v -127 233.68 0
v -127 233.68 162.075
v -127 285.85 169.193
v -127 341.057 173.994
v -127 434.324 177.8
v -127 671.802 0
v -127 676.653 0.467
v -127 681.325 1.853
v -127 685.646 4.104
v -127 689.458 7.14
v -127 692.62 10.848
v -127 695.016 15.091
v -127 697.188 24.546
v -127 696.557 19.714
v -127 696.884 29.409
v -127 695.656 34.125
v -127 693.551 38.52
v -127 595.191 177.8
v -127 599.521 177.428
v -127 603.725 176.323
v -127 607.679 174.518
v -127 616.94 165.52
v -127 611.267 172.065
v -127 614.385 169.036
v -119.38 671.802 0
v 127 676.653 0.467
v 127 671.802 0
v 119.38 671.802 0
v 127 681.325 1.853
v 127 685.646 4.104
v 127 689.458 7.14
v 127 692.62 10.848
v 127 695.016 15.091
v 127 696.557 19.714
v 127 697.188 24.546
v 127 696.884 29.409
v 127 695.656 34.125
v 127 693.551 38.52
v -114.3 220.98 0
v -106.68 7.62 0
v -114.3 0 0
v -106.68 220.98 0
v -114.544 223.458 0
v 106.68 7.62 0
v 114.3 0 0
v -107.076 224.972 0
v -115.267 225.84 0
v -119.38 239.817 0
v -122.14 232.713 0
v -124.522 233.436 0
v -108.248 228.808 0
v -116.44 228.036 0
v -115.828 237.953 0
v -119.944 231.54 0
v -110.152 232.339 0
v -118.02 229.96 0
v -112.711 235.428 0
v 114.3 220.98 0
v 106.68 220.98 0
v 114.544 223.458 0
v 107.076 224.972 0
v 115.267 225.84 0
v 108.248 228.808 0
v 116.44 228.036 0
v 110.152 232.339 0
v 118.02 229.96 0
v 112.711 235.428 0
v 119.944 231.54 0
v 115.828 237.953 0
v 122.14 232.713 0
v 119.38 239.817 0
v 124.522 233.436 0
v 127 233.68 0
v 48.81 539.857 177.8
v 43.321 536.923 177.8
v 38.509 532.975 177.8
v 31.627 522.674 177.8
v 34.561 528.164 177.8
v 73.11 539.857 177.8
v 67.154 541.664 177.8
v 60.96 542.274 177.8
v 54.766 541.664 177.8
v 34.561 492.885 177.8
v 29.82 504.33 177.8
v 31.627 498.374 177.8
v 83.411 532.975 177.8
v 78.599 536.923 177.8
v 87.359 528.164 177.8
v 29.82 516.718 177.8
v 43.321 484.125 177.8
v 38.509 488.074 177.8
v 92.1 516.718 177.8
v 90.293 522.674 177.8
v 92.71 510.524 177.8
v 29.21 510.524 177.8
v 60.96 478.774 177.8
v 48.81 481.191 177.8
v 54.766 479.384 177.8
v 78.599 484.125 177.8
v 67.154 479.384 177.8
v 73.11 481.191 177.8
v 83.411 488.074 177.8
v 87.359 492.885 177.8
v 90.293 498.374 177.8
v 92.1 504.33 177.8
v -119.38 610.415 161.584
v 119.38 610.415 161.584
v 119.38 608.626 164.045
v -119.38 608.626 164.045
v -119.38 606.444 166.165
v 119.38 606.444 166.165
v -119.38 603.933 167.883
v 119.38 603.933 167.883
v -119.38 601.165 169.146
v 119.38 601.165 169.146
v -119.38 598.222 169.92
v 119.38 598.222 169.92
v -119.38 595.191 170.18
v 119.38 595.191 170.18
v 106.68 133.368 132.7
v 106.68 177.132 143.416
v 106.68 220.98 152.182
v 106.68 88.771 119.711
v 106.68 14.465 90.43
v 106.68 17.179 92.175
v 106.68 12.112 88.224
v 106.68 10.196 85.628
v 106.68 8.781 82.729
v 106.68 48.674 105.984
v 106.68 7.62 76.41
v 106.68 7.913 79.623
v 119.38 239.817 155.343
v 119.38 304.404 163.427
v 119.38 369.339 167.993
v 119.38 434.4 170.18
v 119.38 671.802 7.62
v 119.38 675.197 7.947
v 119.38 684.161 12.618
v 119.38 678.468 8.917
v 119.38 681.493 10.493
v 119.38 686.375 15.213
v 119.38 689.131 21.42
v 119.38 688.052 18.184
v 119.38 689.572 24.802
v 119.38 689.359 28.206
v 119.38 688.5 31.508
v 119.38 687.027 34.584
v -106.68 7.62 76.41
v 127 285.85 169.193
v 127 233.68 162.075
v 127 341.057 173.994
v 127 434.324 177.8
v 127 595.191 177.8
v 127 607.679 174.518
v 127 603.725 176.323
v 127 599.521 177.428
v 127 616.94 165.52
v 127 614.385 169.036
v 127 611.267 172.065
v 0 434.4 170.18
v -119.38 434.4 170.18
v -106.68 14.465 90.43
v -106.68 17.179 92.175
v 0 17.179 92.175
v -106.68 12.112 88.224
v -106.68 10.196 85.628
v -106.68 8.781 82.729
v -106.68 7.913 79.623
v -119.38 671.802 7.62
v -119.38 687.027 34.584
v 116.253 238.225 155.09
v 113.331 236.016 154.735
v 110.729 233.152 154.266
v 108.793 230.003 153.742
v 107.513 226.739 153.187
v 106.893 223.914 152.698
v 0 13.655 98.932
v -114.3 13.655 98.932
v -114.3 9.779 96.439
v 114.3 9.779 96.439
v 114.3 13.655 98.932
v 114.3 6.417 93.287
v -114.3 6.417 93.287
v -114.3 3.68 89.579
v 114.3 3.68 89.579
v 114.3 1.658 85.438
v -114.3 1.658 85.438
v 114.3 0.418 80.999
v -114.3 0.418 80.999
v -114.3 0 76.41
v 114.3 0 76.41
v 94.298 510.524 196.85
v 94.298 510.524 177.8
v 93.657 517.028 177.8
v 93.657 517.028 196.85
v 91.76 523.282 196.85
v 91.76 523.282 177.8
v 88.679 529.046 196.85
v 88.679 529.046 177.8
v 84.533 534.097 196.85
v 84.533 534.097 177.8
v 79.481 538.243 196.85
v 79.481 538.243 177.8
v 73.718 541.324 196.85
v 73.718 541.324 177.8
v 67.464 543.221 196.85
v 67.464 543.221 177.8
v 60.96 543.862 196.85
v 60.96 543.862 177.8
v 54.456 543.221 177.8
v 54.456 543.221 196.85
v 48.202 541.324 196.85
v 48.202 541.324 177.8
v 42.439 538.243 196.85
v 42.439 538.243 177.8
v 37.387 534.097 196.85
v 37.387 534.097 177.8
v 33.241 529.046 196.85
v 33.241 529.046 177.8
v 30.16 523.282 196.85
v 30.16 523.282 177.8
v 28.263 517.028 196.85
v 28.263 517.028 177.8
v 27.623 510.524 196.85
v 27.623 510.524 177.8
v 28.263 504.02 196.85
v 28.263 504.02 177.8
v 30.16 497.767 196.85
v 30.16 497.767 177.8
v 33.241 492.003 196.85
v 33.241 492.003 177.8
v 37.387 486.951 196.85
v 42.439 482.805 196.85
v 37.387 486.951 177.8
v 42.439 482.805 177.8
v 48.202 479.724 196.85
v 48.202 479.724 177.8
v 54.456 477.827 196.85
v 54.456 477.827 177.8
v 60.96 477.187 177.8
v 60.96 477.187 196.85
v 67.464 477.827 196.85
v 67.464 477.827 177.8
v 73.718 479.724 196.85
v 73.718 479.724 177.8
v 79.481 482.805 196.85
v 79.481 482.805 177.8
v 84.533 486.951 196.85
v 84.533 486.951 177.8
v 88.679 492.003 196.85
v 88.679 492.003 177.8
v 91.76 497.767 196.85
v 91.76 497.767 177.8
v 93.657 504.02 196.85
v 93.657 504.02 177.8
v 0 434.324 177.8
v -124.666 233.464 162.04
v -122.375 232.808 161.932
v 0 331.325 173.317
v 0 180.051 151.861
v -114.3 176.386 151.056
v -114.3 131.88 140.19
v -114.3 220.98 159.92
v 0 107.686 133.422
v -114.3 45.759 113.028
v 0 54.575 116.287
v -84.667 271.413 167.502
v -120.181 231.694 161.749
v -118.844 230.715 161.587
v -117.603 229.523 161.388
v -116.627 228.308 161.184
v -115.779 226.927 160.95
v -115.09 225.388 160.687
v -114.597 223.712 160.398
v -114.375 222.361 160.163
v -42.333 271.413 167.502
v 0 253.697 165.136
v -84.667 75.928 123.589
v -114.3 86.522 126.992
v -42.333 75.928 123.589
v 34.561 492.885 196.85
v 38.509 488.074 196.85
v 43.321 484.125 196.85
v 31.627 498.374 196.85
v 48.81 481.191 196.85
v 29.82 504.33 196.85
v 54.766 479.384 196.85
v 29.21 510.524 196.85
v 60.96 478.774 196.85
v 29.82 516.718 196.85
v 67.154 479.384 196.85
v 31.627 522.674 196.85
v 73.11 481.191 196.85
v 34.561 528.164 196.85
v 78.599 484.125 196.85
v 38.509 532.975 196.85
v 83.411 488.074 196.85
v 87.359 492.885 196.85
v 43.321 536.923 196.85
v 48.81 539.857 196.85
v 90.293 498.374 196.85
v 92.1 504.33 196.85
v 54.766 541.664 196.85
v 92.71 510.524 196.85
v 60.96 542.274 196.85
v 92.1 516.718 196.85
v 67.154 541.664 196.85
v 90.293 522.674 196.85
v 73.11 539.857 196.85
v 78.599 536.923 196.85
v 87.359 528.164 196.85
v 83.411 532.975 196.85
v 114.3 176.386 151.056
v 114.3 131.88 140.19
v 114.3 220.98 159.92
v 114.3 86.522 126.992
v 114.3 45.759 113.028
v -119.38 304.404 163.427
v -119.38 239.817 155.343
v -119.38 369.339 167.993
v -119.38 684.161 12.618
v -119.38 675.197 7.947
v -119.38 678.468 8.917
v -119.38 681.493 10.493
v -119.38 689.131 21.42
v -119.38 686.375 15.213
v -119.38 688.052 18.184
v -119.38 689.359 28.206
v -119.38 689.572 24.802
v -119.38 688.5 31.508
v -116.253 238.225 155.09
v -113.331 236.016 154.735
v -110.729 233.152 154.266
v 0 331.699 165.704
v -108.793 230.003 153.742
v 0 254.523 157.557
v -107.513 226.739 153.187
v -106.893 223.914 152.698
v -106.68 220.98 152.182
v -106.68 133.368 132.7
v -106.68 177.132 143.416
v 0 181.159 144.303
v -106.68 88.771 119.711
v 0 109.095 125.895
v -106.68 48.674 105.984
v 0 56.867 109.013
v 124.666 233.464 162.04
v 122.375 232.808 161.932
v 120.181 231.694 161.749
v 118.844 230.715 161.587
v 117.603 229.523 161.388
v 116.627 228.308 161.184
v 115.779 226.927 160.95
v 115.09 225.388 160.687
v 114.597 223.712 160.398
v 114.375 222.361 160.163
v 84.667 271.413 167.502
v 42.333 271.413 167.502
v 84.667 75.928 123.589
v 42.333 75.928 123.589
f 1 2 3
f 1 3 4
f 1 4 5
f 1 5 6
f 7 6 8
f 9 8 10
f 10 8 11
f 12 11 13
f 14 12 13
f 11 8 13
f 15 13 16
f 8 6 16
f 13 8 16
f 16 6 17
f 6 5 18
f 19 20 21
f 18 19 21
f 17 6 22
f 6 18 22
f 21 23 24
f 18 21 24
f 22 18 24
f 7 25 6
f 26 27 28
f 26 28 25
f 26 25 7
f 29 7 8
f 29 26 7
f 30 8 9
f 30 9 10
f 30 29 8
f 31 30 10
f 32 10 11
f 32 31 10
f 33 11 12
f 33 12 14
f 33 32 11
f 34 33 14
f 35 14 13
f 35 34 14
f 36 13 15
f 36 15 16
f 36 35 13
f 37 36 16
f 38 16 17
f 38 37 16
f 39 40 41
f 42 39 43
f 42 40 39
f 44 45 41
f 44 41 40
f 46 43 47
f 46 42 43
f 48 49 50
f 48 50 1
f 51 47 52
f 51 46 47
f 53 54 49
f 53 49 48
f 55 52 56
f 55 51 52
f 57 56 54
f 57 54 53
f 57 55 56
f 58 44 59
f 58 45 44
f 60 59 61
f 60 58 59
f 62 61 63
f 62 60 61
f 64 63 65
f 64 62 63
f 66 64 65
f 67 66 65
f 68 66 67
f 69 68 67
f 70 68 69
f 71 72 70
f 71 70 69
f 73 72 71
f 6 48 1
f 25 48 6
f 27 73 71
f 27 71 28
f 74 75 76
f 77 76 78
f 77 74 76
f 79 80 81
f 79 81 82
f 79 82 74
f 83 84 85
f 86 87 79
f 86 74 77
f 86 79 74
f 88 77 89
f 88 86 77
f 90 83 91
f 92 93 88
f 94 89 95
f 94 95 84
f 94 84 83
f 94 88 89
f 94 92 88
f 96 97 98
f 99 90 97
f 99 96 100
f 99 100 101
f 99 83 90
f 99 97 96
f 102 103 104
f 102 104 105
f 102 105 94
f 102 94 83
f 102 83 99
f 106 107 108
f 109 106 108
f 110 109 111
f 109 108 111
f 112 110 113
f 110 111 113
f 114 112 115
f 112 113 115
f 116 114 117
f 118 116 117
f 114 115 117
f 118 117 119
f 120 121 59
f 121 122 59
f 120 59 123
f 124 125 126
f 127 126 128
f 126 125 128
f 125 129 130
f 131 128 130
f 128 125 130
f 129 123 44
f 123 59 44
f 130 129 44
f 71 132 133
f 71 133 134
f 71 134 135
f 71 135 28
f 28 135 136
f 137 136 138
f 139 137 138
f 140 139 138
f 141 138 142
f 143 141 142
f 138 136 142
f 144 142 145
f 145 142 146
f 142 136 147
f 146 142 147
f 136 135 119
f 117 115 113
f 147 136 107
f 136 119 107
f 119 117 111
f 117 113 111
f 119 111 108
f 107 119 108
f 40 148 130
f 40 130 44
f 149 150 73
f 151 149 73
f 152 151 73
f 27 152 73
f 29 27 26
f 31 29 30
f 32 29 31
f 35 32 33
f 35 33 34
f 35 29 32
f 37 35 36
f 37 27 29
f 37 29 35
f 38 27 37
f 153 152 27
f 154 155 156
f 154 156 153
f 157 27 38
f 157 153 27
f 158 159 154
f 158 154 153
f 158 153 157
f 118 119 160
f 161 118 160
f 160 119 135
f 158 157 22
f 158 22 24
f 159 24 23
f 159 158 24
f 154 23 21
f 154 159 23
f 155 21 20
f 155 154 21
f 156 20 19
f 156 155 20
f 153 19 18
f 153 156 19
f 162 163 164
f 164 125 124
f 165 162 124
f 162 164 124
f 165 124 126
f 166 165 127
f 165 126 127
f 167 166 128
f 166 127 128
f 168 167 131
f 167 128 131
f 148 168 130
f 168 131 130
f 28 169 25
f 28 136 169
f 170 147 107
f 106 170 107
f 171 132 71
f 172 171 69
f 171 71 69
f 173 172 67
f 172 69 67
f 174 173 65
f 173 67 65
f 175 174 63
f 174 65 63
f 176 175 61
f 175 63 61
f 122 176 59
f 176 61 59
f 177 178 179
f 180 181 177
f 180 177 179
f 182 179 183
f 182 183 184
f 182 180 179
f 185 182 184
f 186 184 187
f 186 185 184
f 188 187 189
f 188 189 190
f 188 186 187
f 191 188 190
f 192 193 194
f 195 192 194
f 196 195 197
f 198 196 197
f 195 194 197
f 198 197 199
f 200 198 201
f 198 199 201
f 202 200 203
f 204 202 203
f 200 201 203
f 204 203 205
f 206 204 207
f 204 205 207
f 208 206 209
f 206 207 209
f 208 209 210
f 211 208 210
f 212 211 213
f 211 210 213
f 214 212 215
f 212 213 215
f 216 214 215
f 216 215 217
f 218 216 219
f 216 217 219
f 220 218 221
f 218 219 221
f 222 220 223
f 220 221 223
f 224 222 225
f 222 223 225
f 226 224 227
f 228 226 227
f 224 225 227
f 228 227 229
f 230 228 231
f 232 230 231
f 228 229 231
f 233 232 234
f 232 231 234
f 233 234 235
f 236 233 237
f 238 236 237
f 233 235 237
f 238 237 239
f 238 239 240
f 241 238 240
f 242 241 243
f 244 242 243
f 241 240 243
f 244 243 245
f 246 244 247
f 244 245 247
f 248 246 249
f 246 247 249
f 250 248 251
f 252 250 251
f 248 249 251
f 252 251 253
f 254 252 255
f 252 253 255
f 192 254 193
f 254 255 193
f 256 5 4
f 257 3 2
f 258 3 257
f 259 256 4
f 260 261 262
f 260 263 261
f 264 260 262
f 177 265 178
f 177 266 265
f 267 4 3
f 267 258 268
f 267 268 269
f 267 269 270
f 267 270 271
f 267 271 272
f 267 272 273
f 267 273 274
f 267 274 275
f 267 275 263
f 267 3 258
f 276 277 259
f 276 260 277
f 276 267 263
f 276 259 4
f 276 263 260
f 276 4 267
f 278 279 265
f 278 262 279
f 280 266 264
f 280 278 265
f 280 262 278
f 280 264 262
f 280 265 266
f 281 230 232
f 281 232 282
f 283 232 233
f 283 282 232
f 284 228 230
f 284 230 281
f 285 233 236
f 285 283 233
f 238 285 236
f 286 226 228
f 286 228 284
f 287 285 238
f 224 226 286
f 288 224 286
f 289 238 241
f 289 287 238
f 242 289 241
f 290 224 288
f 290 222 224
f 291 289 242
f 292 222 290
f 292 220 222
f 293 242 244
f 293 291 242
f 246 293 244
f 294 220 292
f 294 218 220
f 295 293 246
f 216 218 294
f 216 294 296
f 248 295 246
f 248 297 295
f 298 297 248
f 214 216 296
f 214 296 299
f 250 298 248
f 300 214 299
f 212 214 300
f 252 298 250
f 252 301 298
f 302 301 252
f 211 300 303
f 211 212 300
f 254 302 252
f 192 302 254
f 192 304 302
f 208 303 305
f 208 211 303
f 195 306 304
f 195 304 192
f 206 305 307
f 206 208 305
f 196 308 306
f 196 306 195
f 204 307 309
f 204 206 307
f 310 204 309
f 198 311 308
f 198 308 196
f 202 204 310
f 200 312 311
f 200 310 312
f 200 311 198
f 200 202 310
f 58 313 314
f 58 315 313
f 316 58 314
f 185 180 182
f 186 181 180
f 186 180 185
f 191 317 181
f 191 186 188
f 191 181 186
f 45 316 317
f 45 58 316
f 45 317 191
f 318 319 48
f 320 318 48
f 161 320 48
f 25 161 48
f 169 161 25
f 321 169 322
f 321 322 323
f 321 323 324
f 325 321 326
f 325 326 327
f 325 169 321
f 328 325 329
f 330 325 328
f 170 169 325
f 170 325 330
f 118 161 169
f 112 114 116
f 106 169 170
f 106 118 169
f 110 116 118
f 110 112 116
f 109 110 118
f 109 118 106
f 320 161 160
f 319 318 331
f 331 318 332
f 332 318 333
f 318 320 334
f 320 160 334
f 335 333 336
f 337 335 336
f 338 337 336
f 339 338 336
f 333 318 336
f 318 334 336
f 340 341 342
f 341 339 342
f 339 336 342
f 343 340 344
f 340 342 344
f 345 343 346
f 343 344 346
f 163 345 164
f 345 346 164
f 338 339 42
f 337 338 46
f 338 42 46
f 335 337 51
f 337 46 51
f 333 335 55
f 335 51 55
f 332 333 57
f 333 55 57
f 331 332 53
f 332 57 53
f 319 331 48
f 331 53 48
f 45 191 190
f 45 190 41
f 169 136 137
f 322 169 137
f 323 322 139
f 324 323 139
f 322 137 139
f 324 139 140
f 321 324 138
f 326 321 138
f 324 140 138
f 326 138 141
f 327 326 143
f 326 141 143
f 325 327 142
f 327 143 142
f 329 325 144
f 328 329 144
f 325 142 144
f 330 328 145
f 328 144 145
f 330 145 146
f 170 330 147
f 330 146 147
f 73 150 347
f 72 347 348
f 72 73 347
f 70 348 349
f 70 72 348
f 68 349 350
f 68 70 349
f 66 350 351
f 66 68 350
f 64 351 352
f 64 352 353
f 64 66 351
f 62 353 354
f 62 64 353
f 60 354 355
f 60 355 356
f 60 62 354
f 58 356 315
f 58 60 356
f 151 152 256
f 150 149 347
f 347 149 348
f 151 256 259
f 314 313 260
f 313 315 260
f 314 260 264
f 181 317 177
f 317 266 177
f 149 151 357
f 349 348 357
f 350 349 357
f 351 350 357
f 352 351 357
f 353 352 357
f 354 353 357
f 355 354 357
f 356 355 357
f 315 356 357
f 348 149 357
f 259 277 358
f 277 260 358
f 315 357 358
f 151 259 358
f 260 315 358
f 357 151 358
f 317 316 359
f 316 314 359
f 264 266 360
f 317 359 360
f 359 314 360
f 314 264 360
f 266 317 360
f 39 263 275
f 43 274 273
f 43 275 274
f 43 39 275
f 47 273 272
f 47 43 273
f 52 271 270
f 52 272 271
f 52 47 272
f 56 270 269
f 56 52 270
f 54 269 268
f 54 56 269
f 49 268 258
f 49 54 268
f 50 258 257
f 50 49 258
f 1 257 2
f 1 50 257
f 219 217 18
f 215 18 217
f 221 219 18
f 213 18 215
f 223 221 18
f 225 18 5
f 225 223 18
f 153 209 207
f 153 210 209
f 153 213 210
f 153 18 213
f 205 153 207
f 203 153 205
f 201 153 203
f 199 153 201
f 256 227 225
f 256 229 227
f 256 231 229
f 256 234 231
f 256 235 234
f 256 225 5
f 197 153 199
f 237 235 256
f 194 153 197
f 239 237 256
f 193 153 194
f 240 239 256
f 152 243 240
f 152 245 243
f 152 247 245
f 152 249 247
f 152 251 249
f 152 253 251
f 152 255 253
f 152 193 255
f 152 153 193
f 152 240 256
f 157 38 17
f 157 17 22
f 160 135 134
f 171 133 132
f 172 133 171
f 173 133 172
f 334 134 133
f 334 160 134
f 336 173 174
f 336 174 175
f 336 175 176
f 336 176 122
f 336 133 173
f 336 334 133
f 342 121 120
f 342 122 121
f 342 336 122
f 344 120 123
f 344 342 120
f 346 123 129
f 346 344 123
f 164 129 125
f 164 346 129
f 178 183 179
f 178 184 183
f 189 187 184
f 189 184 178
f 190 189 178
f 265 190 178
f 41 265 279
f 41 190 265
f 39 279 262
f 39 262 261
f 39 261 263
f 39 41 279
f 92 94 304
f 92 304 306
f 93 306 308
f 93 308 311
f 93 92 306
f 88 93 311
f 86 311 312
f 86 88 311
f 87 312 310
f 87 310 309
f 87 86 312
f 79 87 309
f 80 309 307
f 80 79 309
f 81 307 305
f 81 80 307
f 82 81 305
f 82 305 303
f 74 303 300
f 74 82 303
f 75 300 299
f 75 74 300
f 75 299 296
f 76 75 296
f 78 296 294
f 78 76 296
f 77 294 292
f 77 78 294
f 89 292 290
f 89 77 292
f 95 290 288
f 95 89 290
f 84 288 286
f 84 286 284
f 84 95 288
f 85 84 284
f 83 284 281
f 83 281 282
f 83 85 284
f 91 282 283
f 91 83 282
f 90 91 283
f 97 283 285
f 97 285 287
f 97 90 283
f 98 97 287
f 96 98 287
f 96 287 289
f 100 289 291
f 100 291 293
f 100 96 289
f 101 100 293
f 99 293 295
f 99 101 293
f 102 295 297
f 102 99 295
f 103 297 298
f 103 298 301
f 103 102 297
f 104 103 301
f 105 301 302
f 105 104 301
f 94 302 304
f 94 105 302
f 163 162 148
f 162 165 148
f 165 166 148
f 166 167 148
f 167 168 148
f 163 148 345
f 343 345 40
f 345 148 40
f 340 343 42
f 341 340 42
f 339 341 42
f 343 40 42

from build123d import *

# Parameters (mm, degrees)
F1_DEPTH = 127
F3_DEPTH = 177.8
F4_R     = 33.3375
F4_R_2   = 31.75
F5_DEPTH = 19.05
F6_T     = 7.62


# Not quite as in the source:
# - a shell that OpenCascade refuses in one call is made with other operations: the cavity is built on its own and cut out


with BuildPart() as f1:
    # F0 (on Right) → F1 (new body, symmetric)
    with BuildSketch(Plane.YZ):
        with BuildLine():
            Line((0, 76.4100525974), (0, 0))
            Line((0, 0), (671.8020987012, 0))
            ThreePointArc((671.8020987012, 0), (693.9200398628, 12.9117383606), (693.5512826501, 38.5199465532))
            Line((693.5512826501, 38.5199465532), (616.9399846733, 165.5199465532))
            ThreePointArc((616.9399846733, 165.5199465532), (607.6790623638, 174.5179411616), (595.1908007244, 177.8))
            Line((595.1908007244, 177.8), (434.3242754471, 177.8))
            add(Edge.make_bspline(
                [(434.3242754471, 177.8), (377.1008998353, 176.660223353), (237.5491375806, 169.4148859291), (92.7331109855, 131.2042560006), (30.2962614107, 107.6098996029), (13.6550616577, 98.9315184319)],
                knots=[0.1901896549, 0.1901896549, 0.1901896549, 0.1901896549, 0.3812653252, 0.674687688, 0.8202345165, 0.8202345165, 0.8202345165, 0.8202345165], degree=3))
            ThreePointArc((13.6550616577, 98.9315184319), (3.6804070723, 89.5789281398), (0, 76.4100525974))
        make_face()
    extrude(amount=F1_DEPTH, both=True)

    # F2 (on Top) → F3 (cut)
    with BuildSketch(Plane.XY):
        with BuildLine():
            Line((-127, 0), (-114.3, 0))
            Line((-114.3, 0), (-114.3, 220.98))
            ThreePointArc((-114.3, 220.98), (-118.0197438789, 229.9602561211), (-127, 233.68))
            Line((-127, 233.68), (-127, 0))
        make_face()
        with BuildLine():
            Line((114.3, 220.98), (114.3, 0))
            Line((114.3, 0), (127, 0))
            Line((127, 0), (127, 233.68))
            ThreePointArc((127, 233.68), (118.0197438789, 229.9602561211), (114.3, 220.98))
        make_face()
    extrude(amount=F3_DEPTH, mode=Mode.SUBTRACT)

    # F4 (on face) → F5 (join)
    with BuildSketch(Plane.XY.offset(177.8)):
        with Locations((60.96, 510.5242754471)):
            Circle(F4_R)
        with Locations((60.96, 510.5242754471)):
            Circle(F4_R_2, mode=Mode.SUBTRACT)
    extrude(amount=F5_DEPTH)

    # F6: shell of thickness 7.62, made by hand


with BuildPart() as f6_core1:
    # F6_t2: copy of F1
    add(f1.part)

    # the walls: a layer under each face that stays
    f6_faces = [f6_core1.faces().sort_by_distance(p)[0] for p in [
        (-63.5, 178.8934164203, 151.6082143397),
        (63.5, 178.8934164203, 151.6082143397),
        (0, 3.6804070723, 89.5789281398),
        (-114.3, 110.49, 79.9601525115),
        (-118.0197438789, 229.9602561211, 81.0374425071),
        (-127, 465.4410493506, 88.9),
        (0, 514.7575380857, 177.8),
        (114.3, 110.49, 79.9601525115),
        (118.0197438789, 229.9602561211, 81.0374425071),
        (127, 465.4410493506, 88.9),
        (0, 0, 38.2050262987),
        (0, 607.6790623638, 174.5179411616),
        (0, 655.2456336617, 102.0199465532),
        (0, 693.9200398628, 12.9117383606),
        (27.6225, 510.5242754471, 187.325),
        (29.845, 501.6342754471, 196.85),
        (29.21, 510.5242754471, 187.325),
        (60.96, 510.5242754471, 177.8),
    ]]
    thicken(f6_faces, amount=-F6_T, mode=Mode.SUBTRACT)

    # F6_s3 → F6_t4 (revolve, cut)
    with BuildSketch(Plane.XZ.offset(-510.5242754471)):
        Polygon((94.3737, 177.8762), (94.2975, 170.18), (86.6775, 170.18), (86.6775, 177.8), align=None)
    revolve(axis=Axis((60.96, 510.5242754471, 177.8), (0, 0, 1)), mode=Mode.SUBTRACT)

    # F6_s5 → F6_t6 (revolve, cut)
    with BuildSketch(Plane.XZ.offset(-510.5242754471)):
        Polygon((92.6338, 177.8762), (100.33, 177.8), (100.33, 170.18), (92.71, 170.18), align=None)
    revolve(axis=Axis((60.96, 510.5242754471, 177.8), (0, 0, 1)), mode=Mode.SUBTRACT)


with BuildPart() as f1_1:
    add(f1.part)

    # what is left inside the walls is the cavity
    f6_cavity = [f6_core1.part.solids().sort_by_distance(p)[0] for p in [
        (-39.793333, 339.711049, 0.0762),
    ]]
    add(f6_cavity, mode=Mode.SUBTRACT)


solid = f1_1.part
